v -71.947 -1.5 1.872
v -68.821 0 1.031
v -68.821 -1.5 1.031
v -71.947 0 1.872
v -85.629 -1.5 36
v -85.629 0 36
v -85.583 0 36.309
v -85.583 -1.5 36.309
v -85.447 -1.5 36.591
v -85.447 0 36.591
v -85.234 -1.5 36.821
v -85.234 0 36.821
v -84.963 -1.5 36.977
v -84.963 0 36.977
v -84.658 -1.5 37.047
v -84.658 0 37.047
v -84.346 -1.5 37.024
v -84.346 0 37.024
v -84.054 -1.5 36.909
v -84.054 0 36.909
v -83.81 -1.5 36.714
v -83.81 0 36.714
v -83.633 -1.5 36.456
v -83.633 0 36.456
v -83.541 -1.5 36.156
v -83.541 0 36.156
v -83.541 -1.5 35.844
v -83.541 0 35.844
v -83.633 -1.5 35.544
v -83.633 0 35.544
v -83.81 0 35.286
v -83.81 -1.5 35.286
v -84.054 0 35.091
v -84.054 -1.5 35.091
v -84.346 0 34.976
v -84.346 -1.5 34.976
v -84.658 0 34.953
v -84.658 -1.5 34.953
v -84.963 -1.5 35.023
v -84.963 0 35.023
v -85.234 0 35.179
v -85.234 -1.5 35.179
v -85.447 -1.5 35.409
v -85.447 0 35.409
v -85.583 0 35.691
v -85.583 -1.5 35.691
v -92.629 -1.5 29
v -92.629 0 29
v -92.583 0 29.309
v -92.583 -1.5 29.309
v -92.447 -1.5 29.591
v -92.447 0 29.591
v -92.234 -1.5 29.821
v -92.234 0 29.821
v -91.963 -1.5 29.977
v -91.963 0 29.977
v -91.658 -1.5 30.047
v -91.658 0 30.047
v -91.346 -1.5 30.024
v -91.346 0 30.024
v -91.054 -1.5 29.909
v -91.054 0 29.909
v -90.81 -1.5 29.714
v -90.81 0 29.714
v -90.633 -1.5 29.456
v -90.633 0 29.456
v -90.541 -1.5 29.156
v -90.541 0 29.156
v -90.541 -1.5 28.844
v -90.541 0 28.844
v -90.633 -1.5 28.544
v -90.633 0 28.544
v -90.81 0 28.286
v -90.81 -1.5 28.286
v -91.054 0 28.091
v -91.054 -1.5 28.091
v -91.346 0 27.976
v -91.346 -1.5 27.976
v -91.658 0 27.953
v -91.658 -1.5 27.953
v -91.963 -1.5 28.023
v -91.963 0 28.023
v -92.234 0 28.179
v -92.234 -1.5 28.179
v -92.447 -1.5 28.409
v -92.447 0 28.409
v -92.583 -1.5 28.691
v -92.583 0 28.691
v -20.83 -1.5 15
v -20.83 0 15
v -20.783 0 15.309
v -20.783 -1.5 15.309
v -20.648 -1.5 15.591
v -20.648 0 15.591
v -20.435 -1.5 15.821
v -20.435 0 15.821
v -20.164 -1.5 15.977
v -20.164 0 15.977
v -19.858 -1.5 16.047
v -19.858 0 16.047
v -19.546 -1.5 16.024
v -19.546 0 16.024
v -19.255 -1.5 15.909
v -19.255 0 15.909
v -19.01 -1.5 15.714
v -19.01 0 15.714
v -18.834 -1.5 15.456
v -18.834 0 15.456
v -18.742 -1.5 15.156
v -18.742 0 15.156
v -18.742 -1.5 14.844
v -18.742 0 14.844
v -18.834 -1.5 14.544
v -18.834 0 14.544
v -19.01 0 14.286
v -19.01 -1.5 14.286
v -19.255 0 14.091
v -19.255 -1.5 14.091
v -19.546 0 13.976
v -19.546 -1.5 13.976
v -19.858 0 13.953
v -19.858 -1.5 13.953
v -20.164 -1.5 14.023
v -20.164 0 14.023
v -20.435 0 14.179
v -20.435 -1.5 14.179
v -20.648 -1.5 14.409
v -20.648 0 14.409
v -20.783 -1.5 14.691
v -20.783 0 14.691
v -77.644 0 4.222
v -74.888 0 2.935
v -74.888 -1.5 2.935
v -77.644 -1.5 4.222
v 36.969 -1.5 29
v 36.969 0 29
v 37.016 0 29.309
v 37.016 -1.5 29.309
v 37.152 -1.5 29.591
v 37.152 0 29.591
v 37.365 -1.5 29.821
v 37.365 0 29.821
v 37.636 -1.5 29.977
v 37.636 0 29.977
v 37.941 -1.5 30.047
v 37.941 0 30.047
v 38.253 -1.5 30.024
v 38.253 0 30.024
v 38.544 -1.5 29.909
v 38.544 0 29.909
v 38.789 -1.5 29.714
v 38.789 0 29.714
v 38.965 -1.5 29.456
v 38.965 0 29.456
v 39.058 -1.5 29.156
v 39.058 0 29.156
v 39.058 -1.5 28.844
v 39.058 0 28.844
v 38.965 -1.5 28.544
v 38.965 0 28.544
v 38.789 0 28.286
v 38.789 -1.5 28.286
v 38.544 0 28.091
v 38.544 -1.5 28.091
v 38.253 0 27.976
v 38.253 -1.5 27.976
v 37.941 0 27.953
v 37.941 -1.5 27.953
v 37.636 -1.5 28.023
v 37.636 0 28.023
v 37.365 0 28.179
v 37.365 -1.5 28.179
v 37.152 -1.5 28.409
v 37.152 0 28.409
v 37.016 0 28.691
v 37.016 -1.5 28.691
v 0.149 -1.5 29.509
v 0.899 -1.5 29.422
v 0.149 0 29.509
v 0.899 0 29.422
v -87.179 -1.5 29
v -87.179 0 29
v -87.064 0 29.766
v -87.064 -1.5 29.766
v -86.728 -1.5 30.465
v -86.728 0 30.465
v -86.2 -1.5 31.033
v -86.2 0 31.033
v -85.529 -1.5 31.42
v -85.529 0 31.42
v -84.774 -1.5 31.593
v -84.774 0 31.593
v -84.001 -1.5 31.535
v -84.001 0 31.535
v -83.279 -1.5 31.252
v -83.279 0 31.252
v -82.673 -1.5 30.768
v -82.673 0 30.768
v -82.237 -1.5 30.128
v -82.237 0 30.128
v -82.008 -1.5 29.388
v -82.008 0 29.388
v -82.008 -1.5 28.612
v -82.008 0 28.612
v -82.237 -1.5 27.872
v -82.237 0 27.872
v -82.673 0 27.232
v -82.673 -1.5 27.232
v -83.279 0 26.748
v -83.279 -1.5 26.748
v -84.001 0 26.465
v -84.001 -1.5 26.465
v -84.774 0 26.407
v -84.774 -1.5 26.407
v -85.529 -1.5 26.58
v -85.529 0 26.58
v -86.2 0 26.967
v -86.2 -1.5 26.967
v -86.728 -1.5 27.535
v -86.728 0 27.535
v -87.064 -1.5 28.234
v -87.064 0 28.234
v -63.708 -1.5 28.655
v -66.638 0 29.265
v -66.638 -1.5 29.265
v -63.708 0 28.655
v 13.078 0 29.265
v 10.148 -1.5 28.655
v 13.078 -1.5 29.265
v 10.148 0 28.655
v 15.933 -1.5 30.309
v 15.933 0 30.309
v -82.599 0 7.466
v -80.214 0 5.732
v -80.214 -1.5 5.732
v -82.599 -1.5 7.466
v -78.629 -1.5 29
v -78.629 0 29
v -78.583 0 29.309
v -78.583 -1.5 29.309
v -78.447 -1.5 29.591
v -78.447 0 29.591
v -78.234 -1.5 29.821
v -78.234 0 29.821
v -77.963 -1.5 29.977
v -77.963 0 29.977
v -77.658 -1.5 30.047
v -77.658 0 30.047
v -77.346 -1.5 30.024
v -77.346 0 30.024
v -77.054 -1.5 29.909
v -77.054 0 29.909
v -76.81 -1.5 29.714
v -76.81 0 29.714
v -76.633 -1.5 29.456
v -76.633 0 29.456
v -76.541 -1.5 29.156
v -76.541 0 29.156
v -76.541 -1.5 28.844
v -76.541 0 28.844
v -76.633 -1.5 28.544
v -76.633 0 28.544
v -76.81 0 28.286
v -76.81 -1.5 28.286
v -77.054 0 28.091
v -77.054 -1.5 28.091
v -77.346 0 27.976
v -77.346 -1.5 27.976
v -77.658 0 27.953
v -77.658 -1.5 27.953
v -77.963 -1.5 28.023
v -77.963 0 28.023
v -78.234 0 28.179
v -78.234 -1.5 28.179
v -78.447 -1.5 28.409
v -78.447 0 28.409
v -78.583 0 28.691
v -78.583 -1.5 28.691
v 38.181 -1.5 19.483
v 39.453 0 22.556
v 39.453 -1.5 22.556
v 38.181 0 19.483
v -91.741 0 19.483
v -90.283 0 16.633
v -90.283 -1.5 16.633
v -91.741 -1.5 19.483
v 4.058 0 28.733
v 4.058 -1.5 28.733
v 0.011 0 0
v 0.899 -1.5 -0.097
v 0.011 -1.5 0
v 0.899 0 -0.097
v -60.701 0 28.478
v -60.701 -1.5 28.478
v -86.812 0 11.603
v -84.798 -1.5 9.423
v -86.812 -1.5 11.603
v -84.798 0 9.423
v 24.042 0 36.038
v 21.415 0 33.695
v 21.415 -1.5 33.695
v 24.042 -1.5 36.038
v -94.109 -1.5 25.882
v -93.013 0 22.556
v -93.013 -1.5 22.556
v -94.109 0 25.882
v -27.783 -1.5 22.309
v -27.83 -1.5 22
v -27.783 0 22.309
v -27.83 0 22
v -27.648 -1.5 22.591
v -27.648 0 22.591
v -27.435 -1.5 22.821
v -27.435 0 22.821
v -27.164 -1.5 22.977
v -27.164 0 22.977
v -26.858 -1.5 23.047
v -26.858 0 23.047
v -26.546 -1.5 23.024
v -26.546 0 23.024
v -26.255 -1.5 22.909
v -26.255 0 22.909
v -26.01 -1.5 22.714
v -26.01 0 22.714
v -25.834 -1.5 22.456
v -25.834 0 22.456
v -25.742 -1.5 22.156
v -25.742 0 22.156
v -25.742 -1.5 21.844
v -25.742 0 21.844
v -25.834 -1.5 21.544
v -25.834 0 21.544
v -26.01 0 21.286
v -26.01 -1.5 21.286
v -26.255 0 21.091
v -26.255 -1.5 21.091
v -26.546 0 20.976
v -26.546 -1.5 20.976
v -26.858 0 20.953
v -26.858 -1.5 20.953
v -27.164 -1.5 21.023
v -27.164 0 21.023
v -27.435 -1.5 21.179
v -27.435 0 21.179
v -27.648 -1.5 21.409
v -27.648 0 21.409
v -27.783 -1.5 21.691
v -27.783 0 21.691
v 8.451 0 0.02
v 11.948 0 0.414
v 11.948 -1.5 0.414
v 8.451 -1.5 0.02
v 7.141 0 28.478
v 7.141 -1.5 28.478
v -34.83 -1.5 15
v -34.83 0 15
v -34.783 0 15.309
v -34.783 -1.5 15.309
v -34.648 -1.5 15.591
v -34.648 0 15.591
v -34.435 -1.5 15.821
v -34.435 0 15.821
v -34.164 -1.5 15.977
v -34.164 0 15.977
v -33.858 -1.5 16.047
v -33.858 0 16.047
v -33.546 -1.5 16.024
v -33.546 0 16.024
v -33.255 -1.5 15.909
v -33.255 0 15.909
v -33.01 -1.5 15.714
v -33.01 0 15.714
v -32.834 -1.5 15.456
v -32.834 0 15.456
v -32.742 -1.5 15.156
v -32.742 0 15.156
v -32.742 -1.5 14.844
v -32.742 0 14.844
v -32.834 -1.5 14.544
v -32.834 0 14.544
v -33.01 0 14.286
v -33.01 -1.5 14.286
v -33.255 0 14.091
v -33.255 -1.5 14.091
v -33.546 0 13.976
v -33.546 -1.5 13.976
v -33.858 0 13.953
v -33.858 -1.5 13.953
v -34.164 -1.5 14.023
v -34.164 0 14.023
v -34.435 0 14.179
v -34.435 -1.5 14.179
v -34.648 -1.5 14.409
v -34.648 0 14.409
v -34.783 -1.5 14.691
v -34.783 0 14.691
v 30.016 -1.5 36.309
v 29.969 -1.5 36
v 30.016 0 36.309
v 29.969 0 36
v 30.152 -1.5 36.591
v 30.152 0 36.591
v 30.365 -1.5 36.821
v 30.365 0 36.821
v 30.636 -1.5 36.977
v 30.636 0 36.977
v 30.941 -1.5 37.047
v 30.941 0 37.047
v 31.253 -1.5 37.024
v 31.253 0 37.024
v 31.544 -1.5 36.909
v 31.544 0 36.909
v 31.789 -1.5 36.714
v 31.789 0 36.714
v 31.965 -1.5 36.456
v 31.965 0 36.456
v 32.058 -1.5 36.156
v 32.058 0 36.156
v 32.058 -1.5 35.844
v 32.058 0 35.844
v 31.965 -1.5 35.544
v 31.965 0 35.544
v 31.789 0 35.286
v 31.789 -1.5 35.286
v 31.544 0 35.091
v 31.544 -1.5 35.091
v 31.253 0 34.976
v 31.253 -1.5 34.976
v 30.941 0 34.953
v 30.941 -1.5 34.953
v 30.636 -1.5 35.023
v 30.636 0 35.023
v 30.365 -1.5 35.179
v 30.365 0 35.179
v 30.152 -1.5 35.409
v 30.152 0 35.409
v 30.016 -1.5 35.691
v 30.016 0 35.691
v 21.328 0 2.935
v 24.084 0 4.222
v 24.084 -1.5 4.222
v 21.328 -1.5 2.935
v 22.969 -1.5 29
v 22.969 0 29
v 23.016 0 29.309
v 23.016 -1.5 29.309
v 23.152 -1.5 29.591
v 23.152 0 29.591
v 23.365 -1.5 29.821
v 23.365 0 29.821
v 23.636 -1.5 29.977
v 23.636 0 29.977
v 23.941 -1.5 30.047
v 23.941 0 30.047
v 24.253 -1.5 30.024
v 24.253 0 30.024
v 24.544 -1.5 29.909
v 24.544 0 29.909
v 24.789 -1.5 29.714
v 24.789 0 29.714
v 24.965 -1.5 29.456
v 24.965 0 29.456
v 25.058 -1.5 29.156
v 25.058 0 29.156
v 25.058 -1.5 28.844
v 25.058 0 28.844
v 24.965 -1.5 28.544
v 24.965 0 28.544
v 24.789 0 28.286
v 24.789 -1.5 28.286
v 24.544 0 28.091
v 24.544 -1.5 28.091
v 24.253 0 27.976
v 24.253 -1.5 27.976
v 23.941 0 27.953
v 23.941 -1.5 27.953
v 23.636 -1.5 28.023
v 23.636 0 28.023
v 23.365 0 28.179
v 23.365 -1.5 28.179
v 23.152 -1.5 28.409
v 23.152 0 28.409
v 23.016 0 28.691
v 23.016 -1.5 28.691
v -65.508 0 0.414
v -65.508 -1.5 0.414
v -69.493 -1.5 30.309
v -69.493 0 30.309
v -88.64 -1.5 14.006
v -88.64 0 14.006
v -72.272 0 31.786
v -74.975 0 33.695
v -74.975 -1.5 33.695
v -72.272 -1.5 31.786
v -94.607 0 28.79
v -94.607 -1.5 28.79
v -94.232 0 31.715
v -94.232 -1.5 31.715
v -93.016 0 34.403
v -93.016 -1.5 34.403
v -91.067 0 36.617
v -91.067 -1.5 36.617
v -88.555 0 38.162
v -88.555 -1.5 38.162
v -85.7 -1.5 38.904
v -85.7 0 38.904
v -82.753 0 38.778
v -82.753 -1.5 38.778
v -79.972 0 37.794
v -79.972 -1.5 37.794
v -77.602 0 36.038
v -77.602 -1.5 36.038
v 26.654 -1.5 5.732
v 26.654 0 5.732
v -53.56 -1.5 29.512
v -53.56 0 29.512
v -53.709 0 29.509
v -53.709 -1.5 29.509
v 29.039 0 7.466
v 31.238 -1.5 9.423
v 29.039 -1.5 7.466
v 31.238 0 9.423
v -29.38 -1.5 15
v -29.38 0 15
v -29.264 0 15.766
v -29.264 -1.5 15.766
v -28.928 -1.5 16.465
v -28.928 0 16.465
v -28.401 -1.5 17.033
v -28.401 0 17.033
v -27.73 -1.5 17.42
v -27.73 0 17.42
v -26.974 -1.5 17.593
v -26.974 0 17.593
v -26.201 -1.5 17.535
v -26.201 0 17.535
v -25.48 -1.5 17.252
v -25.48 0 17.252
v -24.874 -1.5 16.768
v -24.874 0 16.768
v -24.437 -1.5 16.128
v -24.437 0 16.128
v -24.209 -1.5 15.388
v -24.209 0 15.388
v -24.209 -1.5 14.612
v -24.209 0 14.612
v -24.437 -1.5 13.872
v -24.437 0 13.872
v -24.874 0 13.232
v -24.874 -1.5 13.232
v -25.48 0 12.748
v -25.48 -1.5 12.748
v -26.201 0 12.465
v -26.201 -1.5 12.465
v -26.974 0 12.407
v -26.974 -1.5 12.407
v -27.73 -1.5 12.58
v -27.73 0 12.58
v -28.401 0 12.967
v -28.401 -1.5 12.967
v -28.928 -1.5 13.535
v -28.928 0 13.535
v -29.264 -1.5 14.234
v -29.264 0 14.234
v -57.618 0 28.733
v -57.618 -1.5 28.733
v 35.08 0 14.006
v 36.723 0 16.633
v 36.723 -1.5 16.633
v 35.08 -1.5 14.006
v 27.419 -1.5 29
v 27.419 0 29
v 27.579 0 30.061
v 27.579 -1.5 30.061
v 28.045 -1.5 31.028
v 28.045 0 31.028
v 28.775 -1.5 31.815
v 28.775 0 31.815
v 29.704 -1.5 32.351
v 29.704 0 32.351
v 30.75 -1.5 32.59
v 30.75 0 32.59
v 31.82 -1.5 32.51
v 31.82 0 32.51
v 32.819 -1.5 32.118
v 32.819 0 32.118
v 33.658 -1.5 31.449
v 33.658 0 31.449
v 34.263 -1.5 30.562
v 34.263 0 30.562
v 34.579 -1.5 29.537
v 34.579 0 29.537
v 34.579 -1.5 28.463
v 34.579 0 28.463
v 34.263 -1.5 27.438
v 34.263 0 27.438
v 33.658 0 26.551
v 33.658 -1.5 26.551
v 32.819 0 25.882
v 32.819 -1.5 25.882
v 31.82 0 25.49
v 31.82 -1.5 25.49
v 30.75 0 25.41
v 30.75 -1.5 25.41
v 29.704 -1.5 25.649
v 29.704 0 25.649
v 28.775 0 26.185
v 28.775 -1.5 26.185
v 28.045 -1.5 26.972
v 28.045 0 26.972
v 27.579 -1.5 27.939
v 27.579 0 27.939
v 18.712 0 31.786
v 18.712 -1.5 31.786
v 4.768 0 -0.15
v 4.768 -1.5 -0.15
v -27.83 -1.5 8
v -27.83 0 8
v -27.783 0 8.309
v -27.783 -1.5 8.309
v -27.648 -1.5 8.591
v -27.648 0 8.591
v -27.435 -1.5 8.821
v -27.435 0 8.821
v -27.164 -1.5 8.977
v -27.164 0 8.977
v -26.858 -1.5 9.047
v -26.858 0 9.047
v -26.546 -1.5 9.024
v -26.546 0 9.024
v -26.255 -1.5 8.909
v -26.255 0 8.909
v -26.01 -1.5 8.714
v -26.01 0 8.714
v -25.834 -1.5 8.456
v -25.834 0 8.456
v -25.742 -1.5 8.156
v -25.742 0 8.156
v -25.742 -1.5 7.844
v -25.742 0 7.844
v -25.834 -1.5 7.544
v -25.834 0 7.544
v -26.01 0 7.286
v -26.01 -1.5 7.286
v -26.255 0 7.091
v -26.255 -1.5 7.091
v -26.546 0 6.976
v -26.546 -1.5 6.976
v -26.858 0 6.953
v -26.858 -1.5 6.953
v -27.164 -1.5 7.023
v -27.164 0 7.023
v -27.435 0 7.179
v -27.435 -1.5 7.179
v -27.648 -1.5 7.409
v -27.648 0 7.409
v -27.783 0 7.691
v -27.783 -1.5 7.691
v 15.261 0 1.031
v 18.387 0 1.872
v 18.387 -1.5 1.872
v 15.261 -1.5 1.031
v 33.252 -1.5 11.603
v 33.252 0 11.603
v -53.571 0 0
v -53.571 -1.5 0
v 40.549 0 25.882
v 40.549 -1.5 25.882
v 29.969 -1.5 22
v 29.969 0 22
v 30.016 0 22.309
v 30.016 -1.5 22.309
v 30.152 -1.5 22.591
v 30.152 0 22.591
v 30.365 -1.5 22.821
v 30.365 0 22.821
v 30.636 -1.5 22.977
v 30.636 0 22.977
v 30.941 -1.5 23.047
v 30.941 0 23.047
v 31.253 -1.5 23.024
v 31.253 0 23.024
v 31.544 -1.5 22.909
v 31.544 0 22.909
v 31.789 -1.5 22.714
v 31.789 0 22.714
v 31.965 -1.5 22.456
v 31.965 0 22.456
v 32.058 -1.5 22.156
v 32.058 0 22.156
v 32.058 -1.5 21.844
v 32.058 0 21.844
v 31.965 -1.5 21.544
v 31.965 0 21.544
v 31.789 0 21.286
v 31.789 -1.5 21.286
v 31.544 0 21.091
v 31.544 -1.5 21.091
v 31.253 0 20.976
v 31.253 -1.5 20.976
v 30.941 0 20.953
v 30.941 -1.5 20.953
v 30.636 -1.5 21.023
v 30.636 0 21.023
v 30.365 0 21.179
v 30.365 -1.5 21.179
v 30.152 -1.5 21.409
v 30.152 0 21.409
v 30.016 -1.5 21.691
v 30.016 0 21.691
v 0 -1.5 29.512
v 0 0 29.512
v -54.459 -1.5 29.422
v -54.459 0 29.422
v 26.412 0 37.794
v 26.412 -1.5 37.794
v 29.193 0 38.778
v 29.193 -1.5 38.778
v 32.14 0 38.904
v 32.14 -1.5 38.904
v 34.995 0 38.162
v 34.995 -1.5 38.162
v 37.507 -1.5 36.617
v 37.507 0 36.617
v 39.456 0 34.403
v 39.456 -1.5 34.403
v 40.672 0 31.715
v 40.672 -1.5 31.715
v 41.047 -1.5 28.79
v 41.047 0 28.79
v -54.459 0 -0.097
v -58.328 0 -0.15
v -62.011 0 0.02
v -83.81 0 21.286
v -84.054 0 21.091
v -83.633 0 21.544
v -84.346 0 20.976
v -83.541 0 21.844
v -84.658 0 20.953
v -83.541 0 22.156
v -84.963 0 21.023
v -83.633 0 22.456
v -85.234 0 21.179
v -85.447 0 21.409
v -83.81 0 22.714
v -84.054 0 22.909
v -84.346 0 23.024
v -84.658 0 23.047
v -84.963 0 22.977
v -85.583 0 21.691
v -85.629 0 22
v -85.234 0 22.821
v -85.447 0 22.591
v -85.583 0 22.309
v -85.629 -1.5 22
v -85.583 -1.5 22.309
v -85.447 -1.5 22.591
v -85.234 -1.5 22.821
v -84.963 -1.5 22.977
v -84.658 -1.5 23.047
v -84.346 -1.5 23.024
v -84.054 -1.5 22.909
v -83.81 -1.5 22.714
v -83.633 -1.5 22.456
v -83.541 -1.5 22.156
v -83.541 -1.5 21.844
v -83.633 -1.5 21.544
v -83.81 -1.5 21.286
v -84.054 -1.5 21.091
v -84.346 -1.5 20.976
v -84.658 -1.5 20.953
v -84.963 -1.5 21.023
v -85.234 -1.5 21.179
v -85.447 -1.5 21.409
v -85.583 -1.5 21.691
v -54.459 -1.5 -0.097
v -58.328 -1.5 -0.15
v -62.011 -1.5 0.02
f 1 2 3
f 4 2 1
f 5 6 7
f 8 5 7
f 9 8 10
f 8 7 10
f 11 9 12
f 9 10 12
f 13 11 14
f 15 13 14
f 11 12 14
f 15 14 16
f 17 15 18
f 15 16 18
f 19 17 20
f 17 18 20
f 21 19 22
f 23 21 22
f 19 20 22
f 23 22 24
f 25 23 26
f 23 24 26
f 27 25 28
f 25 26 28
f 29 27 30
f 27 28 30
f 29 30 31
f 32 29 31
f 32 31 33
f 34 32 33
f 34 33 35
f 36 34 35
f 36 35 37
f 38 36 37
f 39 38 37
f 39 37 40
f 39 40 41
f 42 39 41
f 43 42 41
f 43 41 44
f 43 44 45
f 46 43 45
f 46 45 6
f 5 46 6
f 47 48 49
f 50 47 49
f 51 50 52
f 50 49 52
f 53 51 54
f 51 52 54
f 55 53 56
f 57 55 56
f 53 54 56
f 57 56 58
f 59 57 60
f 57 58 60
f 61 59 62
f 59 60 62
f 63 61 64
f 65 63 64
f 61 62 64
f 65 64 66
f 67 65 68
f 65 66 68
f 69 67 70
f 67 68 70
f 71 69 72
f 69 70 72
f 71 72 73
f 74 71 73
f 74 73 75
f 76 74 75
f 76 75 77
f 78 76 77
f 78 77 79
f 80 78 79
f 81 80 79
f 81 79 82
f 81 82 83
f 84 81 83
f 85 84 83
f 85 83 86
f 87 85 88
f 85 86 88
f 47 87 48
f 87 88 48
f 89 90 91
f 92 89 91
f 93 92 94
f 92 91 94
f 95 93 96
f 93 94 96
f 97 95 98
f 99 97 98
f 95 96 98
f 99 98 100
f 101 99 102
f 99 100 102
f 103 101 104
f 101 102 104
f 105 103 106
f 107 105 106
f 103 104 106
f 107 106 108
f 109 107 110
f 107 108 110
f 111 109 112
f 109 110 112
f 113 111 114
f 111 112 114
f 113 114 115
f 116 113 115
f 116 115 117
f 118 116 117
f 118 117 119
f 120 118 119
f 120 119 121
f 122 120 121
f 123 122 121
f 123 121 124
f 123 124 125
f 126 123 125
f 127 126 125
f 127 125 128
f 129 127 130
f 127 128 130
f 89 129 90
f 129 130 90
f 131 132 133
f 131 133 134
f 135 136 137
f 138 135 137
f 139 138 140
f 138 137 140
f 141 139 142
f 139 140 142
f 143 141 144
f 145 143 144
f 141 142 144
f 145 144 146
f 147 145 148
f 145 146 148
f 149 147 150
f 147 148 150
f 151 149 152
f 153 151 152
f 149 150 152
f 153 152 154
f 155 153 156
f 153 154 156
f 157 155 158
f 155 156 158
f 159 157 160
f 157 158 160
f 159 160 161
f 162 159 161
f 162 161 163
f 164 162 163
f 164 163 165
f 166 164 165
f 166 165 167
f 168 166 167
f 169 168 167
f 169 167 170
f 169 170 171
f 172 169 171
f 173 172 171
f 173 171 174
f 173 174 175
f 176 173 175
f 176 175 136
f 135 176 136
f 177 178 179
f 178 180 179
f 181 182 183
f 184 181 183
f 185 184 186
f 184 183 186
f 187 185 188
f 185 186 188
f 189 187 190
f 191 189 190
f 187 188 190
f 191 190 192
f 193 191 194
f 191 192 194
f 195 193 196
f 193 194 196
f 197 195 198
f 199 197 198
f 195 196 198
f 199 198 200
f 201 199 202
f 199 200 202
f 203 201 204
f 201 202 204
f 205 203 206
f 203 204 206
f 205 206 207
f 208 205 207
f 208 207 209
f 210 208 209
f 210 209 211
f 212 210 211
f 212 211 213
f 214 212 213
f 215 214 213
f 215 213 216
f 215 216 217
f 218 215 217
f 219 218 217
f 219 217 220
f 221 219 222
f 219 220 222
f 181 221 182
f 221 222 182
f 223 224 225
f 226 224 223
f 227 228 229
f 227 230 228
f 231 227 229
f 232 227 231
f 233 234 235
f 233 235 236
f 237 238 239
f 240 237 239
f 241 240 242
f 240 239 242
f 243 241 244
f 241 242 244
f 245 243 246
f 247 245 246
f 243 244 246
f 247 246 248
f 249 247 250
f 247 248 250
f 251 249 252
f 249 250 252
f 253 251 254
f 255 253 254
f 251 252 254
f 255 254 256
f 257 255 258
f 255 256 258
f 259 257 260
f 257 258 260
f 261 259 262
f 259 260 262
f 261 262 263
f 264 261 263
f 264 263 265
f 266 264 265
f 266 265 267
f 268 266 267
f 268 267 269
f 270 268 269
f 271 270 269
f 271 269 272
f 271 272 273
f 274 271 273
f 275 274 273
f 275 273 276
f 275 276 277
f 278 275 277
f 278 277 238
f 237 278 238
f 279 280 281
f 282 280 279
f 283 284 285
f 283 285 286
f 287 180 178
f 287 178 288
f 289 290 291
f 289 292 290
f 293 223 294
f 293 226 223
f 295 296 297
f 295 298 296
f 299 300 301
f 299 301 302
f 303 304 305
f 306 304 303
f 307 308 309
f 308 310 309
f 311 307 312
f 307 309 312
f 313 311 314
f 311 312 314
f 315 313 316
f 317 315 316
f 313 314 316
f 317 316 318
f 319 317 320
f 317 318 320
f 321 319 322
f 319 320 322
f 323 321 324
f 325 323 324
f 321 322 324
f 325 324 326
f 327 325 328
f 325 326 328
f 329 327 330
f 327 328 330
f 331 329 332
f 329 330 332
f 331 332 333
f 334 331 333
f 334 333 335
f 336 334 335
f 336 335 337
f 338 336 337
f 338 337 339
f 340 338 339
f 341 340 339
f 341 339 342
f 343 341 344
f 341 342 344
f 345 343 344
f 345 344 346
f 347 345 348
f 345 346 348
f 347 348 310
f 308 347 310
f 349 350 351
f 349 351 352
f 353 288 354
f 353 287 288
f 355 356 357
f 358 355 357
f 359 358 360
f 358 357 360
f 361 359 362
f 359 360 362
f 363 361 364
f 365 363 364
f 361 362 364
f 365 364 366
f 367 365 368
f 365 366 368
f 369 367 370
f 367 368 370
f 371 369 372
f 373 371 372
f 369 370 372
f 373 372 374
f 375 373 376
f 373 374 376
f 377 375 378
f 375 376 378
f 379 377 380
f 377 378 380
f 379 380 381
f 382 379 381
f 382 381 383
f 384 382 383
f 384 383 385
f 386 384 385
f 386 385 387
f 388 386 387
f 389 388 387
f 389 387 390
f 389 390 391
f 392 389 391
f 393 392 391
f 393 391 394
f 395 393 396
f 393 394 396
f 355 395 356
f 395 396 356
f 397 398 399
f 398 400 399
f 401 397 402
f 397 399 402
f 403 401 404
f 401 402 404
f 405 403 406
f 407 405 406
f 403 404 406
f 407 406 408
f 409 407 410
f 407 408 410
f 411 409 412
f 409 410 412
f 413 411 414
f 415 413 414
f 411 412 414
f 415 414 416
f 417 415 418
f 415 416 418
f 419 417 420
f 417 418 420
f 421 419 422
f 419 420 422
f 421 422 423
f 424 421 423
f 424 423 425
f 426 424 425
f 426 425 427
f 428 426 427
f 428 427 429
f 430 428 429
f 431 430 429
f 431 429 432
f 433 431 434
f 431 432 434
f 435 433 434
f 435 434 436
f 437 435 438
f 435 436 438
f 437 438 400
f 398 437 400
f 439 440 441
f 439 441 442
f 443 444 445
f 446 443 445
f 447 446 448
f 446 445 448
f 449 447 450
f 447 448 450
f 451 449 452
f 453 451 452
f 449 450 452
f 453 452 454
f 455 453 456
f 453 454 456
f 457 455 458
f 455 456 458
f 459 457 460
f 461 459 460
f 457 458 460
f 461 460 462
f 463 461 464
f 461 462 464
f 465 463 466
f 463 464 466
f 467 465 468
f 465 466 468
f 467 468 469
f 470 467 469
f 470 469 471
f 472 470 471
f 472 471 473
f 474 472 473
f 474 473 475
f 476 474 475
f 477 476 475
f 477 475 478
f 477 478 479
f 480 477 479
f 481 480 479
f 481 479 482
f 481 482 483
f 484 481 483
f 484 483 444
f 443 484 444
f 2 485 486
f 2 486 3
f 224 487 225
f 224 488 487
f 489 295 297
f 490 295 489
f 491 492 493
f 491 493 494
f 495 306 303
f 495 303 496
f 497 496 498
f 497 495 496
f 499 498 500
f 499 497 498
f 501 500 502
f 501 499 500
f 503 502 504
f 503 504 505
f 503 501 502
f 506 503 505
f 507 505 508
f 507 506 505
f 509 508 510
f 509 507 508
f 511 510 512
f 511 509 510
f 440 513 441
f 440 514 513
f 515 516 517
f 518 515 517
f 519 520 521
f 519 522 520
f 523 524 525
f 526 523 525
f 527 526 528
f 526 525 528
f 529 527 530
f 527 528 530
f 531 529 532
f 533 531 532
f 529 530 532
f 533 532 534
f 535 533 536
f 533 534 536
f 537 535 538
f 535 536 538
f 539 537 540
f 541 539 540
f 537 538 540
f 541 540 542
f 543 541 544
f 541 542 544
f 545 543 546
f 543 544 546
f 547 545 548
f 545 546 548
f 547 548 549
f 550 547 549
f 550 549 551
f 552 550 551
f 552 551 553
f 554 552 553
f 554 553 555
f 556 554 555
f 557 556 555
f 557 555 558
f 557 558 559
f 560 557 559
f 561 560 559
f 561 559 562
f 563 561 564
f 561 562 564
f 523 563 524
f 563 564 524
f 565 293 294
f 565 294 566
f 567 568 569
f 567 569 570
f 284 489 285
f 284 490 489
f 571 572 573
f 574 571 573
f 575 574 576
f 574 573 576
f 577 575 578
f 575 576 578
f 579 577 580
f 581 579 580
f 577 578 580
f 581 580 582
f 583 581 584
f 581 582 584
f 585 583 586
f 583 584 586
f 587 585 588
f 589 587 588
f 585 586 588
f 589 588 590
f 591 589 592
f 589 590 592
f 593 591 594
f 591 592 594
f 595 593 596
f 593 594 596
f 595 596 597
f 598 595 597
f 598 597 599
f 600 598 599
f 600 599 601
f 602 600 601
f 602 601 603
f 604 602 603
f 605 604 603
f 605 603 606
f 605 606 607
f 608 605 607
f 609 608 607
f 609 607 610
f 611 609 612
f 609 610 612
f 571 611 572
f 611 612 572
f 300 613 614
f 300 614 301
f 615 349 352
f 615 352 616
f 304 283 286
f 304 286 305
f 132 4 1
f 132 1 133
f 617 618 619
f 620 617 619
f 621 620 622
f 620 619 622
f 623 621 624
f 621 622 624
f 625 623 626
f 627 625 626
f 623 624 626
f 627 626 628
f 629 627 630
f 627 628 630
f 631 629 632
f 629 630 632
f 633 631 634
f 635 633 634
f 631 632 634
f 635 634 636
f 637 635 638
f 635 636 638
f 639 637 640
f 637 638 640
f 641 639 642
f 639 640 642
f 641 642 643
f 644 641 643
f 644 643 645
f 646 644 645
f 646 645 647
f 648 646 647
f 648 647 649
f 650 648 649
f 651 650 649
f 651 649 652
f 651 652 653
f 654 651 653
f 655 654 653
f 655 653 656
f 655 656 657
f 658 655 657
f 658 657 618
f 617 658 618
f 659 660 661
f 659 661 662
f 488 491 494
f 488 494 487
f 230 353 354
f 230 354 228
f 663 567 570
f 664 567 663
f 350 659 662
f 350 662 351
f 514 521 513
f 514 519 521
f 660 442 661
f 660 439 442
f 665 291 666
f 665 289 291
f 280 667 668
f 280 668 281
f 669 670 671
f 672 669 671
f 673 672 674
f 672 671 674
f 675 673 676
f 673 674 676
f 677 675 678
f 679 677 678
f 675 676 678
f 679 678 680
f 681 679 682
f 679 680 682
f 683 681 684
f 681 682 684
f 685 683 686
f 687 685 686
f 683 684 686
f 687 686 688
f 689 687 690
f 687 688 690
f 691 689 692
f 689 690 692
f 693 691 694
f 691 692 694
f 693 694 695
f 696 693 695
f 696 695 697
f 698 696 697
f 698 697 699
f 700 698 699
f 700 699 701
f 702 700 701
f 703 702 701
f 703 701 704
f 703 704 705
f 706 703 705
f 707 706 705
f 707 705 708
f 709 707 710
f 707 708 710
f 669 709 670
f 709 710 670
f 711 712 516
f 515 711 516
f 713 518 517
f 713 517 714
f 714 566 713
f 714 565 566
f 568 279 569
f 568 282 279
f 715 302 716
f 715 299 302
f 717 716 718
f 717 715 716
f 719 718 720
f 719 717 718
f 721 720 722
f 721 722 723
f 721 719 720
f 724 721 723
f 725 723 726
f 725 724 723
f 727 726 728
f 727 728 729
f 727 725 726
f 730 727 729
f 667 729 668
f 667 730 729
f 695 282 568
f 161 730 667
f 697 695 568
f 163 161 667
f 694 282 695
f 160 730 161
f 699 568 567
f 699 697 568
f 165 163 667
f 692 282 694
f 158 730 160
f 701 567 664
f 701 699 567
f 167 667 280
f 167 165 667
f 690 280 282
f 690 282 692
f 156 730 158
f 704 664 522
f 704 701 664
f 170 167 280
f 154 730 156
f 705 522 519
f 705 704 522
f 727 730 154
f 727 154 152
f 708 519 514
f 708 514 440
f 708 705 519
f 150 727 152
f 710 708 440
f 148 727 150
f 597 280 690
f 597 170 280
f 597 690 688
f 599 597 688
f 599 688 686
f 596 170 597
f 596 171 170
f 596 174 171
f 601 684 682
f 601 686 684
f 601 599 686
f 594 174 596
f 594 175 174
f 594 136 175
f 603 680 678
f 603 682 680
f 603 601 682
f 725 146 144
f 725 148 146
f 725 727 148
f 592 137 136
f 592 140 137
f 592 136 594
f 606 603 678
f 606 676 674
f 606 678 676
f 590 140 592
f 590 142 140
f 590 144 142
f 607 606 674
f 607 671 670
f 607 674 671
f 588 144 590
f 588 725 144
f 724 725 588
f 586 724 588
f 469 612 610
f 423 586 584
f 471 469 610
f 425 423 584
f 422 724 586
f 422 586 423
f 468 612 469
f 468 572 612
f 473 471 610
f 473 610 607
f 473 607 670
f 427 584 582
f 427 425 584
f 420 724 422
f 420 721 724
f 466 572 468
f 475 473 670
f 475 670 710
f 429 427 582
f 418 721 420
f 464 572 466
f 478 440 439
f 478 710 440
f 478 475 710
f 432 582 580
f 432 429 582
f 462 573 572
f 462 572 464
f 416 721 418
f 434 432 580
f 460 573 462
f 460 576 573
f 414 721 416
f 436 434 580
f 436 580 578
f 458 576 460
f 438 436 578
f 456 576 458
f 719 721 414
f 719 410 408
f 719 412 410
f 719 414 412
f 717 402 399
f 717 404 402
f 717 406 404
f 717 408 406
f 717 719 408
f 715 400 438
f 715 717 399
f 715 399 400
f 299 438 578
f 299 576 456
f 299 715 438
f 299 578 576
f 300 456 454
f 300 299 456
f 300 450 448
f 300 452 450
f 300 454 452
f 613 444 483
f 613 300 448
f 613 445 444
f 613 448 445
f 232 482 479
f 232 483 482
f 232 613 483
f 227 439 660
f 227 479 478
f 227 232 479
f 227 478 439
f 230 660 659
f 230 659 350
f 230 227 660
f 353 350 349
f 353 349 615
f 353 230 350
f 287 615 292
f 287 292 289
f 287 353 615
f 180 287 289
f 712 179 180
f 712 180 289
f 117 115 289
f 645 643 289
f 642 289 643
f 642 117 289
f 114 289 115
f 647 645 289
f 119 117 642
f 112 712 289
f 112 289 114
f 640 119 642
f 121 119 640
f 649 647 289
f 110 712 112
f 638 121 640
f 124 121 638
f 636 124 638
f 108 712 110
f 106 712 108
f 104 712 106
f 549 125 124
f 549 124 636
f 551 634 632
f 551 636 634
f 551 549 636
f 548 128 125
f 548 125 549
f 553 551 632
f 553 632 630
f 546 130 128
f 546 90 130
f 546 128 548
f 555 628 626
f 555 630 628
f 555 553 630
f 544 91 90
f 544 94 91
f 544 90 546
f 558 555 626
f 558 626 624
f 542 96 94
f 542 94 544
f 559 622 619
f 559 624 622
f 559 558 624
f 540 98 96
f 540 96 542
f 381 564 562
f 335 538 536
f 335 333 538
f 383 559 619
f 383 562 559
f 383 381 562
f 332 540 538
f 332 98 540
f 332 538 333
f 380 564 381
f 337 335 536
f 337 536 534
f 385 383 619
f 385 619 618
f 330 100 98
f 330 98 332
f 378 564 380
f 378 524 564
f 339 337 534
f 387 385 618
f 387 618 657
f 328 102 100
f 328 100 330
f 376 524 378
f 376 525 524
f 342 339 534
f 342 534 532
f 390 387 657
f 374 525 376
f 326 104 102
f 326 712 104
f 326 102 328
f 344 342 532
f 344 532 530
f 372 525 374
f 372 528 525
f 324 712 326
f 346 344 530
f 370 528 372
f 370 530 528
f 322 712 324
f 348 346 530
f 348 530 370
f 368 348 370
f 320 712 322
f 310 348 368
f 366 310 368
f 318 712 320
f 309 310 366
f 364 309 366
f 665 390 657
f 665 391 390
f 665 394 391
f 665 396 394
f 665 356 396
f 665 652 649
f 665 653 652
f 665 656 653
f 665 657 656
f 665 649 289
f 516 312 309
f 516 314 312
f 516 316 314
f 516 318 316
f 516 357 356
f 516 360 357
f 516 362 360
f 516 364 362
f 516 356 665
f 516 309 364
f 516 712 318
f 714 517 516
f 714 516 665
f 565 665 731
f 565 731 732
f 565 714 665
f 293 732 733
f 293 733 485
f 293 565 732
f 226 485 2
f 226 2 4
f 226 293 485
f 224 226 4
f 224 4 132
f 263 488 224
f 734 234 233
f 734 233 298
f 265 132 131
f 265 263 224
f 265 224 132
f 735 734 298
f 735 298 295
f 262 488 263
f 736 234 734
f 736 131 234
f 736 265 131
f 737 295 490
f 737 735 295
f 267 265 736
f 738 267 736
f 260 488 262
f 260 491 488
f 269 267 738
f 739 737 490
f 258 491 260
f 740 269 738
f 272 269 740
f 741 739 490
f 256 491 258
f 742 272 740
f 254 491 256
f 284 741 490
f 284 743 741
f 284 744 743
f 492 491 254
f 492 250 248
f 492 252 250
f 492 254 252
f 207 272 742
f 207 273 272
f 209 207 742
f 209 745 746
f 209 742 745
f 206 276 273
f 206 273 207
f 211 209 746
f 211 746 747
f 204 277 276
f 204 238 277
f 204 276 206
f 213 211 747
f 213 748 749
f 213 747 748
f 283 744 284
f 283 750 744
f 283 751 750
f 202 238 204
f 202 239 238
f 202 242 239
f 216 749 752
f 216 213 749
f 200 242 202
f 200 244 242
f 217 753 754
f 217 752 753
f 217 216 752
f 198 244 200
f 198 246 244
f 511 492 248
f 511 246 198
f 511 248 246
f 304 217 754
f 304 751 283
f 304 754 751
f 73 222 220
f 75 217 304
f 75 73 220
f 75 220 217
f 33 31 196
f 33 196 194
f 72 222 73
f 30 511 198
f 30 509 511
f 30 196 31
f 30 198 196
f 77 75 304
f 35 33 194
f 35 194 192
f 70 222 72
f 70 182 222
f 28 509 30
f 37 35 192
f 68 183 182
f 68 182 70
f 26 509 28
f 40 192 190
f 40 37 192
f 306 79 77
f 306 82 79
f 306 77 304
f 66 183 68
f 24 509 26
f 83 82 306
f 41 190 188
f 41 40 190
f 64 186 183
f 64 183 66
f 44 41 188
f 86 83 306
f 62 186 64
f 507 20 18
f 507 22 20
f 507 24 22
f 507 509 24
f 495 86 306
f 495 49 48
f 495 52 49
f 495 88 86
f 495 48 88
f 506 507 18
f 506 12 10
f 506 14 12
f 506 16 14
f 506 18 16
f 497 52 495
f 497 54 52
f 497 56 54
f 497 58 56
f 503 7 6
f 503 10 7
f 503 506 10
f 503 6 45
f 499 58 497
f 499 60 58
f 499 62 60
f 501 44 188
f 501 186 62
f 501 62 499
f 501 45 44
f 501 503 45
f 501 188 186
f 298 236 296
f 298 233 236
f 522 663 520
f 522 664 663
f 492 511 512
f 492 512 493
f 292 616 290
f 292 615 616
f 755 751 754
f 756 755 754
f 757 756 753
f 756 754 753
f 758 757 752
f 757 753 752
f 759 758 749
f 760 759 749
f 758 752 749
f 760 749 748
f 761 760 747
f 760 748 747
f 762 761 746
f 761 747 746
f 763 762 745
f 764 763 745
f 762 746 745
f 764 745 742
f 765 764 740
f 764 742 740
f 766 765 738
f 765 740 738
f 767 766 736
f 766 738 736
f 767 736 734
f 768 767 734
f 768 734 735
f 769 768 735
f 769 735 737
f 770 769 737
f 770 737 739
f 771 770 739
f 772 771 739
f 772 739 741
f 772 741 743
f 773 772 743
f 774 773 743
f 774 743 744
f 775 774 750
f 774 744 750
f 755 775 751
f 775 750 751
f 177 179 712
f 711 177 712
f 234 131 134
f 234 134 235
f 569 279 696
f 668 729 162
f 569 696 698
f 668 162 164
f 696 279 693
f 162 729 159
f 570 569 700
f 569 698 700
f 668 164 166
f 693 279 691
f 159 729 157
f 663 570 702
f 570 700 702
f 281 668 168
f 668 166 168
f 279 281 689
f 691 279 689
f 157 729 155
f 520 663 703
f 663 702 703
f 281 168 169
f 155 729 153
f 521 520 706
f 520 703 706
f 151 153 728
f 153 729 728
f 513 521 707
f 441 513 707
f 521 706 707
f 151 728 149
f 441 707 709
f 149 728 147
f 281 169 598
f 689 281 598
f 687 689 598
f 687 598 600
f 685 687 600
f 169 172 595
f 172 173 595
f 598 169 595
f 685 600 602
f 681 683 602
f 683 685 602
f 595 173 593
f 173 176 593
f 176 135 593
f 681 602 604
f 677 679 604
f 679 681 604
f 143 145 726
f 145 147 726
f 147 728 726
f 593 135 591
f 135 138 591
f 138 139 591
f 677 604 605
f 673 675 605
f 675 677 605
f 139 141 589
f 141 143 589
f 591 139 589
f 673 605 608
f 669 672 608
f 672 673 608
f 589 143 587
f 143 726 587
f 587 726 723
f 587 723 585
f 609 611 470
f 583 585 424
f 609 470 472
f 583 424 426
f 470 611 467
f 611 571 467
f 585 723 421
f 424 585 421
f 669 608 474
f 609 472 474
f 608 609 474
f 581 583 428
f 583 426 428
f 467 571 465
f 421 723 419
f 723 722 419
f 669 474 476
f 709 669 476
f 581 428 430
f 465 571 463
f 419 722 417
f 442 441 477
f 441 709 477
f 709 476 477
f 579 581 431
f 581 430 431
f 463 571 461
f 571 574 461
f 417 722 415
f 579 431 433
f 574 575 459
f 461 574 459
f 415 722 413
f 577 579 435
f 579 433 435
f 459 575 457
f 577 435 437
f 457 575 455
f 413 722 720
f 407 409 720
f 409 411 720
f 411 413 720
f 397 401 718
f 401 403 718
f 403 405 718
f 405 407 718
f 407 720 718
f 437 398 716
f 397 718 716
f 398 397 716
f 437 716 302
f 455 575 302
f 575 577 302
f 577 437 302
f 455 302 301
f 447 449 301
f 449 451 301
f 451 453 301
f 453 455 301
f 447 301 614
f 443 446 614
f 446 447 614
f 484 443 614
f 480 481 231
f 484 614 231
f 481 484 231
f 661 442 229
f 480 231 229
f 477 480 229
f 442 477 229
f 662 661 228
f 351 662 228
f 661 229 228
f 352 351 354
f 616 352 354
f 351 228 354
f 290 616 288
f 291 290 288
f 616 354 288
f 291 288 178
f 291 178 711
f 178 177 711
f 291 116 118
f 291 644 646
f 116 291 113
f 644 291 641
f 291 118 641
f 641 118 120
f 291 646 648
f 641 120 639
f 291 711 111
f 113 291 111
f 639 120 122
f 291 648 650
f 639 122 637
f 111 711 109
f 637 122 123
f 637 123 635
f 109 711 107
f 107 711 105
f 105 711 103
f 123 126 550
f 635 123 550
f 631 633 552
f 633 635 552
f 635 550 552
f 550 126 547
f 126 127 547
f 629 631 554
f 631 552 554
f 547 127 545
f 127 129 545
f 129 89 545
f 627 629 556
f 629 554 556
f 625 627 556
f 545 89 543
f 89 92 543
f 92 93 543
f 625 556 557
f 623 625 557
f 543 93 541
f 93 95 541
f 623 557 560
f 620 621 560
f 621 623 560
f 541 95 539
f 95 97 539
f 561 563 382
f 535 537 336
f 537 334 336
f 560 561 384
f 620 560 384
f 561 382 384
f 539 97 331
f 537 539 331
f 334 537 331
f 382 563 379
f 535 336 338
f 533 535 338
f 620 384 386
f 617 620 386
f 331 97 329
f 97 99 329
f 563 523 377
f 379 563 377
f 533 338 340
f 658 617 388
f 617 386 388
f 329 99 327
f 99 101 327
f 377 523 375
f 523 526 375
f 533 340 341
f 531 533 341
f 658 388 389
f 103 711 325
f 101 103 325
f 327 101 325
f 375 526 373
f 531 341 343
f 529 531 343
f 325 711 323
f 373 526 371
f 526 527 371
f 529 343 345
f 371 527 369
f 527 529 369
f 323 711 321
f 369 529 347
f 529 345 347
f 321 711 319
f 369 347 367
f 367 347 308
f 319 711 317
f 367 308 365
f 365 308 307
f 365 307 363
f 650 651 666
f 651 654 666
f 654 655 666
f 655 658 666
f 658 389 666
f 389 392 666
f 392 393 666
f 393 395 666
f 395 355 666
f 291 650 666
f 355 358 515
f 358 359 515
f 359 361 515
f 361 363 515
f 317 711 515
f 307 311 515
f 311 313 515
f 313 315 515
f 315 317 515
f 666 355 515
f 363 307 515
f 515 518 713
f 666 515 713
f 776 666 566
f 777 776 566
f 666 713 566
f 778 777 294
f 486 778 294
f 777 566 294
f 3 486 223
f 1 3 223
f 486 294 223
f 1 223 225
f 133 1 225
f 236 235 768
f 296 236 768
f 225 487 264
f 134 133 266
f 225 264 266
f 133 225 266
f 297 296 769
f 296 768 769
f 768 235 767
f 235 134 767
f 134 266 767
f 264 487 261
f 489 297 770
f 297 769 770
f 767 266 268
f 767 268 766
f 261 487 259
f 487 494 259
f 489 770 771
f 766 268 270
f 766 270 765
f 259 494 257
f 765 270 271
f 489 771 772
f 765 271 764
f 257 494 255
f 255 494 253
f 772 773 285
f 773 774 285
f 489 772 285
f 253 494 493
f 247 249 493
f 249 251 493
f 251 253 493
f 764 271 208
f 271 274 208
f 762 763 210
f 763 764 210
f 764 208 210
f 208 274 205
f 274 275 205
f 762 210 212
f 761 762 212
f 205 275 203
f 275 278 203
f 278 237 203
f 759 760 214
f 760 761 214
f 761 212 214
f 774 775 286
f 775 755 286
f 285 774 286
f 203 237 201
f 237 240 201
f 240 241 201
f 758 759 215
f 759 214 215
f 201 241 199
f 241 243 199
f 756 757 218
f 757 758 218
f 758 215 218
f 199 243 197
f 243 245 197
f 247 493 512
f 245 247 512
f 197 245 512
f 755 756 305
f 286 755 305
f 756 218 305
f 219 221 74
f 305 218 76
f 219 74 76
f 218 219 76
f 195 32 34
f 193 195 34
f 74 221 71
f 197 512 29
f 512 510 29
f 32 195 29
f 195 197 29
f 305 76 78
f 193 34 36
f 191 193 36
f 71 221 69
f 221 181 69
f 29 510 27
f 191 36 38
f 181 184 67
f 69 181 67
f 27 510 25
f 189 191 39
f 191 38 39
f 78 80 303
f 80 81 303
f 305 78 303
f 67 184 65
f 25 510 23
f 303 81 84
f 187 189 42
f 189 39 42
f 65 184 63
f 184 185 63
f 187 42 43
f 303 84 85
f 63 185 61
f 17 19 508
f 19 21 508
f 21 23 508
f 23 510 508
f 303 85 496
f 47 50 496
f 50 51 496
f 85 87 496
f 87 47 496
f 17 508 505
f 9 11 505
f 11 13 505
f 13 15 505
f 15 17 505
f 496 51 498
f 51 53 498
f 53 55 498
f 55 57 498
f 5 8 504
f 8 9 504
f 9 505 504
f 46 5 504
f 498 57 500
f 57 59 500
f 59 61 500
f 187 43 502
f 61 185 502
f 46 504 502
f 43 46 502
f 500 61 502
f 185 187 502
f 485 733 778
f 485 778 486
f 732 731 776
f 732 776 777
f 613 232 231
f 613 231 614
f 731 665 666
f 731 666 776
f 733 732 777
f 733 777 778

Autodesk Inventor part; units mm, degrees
ref_plane "YZ Plane" through (0, 0, 0) normal (1, 0, 0) x (0, 1, 0)
ref_plane "XZ Plane" through (0, 0, 0) normal (0, 1, 0) x (-1, 0, 0)
ref_plane "XY Plane" through (0, 0, 0) normal (0, 0, 1) x (1, 0, 0)
sketch "Sketch1" plane through (0, 0, 0) normal (0, 1, 0) x (-1, 0, 0)
  line L0 (-0.4496, 29.8144) -> (-0.4496, -0.0337)
  line L1 (54.0096, -0.0338) -> (54.0096, 29.8144)
  line L2 (53.5706, 0) -> (53.6221, -0.0838)
  line L3 (53.56, 0) -> (53.5706, 0)
  line L4 (53.56, -0.0837) -> (53.56, 0)
  line L5 (-0.0106, 0) -> (-0.0621, -0.0838)
  line L6 (-0.8993, -0.0972) -> (-0.0106, 0)
  line L7 (53.5706, 0) -> (54.4593, -0.0972)
  line L8 (0, 0) -> (0, -0.0837)
  line L9 (-0.0106, 0) -> (0, 0)
  line L10 (0, 0) -> (53.56, 0)
  line L11 (53.7094, 29.5089) -> (53.5853, 29.9994)
  line L12 (53.56, 29.512) -> (53.7094, 29.5089)
  line L13 (53.56, 30) -> (53.56, 29.512)
  line L14 (-0.1494, 29.5089) -> (-0.0253, 29.9994)
  line L15 (-0.8993, 29.4222) -> (-0.1494, 29.5089)
  line L16 (0, 29.512) -> (0, 30)
  line L17 (-0.1494, 29.5089) -> (0, 29.512)
  line L18 (53.7094, 29.5089) -> (54.4593, 29.4222)
  line L19 (0, 29.512) -> (53.56, 29.512)
  circle A0 centre (26.78, 15) radius 2.6
  circle A1 centre (84.5793, 29) radius 2.6
  circle A2 centre (-31.0193, 29) radius 3.6
  circle A3 centre (91.5793, 29) radius 1.05
  circle A4 centre (84.5793, 36) radius 1.05
  circle A5 centre (84.5793, 22) radius 1.05
  circle A6 centre (77.5793, 29) radius 1.05
  circle A7 centre (-38.0193, 29) radius 1.05
  circle A8 centre (-31.0193, 36) radius 1.05
  circle A9 centre (-31.0193, 22) radius 1.05
  circle A10 centre (-24.0193, 29) radius 1.05
  circle A11 centre (19.78, 15) radius 1.05
  circle A12 centre (26.78, 22) radius 1.05
  circle A13 centre (33.78, 15) radius 1.05
  circle A14 centre (26.78, 8) radius 1.05
  line L20 (53.5853, 29.9994) -> (53.56, 30)
  line L21 (53.6221, -0.0838) -> (53.56, -0.0837)
  line L22 (-0.0621, -0.0838) -> (-0.8993, -0.0972)
  line L23 (-0.0253, 29.9994) -> (-0.8993, 29.4222)
  line L24 (77.602, 36.0383) -> (74.975, 33.6954)
  line L25 (74.975, 33.6954) -> (72.272, 31.7856)
  line L26 (72.272, 31.7856) -> (69.4931, 30.3089)
  line L27 (69.4931, 30.3089) -> (66.6383, 29.2653)
  line L28 (66.6383, 29.2653) -> (63.7075, 28.6549)
  line L29 (63.7075, 28.6549) -> (60.7007, 28.4776)
  line L30 (60.7007, 28.4776) -> (57.618, 28.7333)
  line L31 (57.618, 28.7333) -> (54.4593, 29.4222)
  line L32 (54.4593, -0.0972) -> (53.6221, -0.0838)
  line L33 (-40.5487, 25.8824) -> (-39.4527, 22.5565)
  line L34 (-39.4527, 22.5565) -> (-38.1807, 19.4832)
  line L35 (-38.1807, 19.4832) -> (-36.7234, 16.6331)
  line L36 (-36.7234, 16.6331) -> (-35.0805, 14.0064)
  line L37 (-35.0805, 14.0064) -> (-33.2522, 11.6029)
  line L38 (-33.2522, 11.6029) -> (-31.2384, 9.4228)
  line L39 (-31.2384, 9.4228) -> (-29.0391, 7.4659)
  line L40 (-29.0391, 7.4659) -> (-26.6543, 5.7324)
  line L41 (-26.6543, 5.7324) -> (-24.0841, 4.2221)
  line L42 (-24.0841, 4.2221) -> (-21.3284, 2.9352)
  line L43 (-21.3284, 2.9352) -> (-18.3872, 1.8715)
  line L44 (-18.3872, 1.8715) -> (-15.2606, 1.0312)
  line L45 (-15.2606, 1.0312) -> (-11.9485, 0.4141)
  line L46 (-11.9485, 0.4141) -> (-8.4509, 0.0204)
  line L47 (-8.4509, 0.0204) -> (-4.7678, -0.1501)
  line L48 (-4.7678, -0.1501) -> (-0.8993, -0.0972)
  line L49 (0, 30) -> (-0.0253, 29.9994)
  line L50 (54.4593, -0.0972) -> (58.3278, -0.1501)
  line L51 (58.3278, -0.1501) -> (62.0109, 0.0204)
  line L52 (62.0109, 0.0204) -> (65.5085, 0.4141)
  line L53 (65.5085, 0.4141) -> (68.8206, 1.0312)
  line L54 (68.8206, 1.0312) -> (71.9472, 1.8715)
  line L55 (71.9472, 1.8715) -> (74.8884, 2.9352)
  line L56 (74.8884, 2.9352) -> (77.6441, 4.2221)
  line L57 (77.6441, 4.2221) -> (80.2143, 5.7324)
  line L58 (80.2143, 5.7324) -> (82.5991, 7.4659)
  line L59 (82.5991, 7.4659) -> (84.7984, 9.4228)
  line L60 (84.7984, 9.4228) -> (86.8122, 11.6029)
  line L61 (86.8122, 11.6029) -> (88.6405, 14.0064)
  line L62 (88.6405, 14.0064) -> (90.2834, 16.6331)
  line L63 (90.2834, 16.6331) -> (91.7407, 19.4832)
  line L64 (91.7407, 19.4832) -> (93.0127, 22.5565)
  line L65 (93.0127, 22.5565) -> (94.1087, 25.8824)
  line L66 (54.4593, 29.4222) -> (53.5853, 29.9994)
  line L67 (-0.8993, 29.4222) -> (-4.058, 28.7333)
  line L68 (-4.058, 28.7333) -> (-7.1407, 28.4776)
  line L69 (-7.1407, 28.4776) -> (-10.1475, 28.6549)
  line L70 (-10.1475, 28.6549) -> (-13.0783, 29.2653)
  line L71 (-13.0783, 29.2653) -> (-15.9331, 30.3089)
  line L72 (-15.9331, 30.3089) -> (-18.712, 31.7856)
  line L73 (-18.712, 31.7856) -> (-21.415, 33.6954)
  line L74 (-21.415, 33.6954) -> (-24.042, 36.0383)
  line L75 (0, -0.0837) -> (-0.0621, -0.0838)
  line L76 (53.56, 30) -> (0, 30)
  arc A15 (-24.042, 36.0383) -> (-40.5487, 25.8824) centre (-31.0892, 28.9999) ccw
  arc A16 (94.1087, 25.8824) -> (77.602, 36.0383) centre (84.6492, 28.9999) ccw
  line L77 (53.56, -0.0837) -> (0, -0.0837)
  line L78 (54.4593, 29.4222) -> (54.4593, -0.0972)
  line L79 (-0.8993, -0.0972) -> (-0.8993, 29.4222)
  line L80 (53.56, 0) -> (53.56, 30)
  line L81 (0, 30) -> (0, 0)
  point P0 (0, 0)
extrude "Extrusion1" add sketch "Sketch1" against normal blind 1.5 contours L15 L17 L81 L9 L6 L79 | L79 L48 L47 L46 L45 L44 L43 L42 L41 L40 L39 L38 L37 L36 L35 L34 L33 A15 L74 L73 L72 L71 L70 L69 L68 L67 | L19 L80 L10 L81 | L12 L18 L78 L7 L3 L80 | L31 L30 L29 L28 L27 L26 L25 L24 A16 L65 L64 L63 L62 L61 L60 L59 L58 L57 L56 L55 L54 L53 L52 L51 L50 L78
properties part number "axis_15_bottom_frame"
